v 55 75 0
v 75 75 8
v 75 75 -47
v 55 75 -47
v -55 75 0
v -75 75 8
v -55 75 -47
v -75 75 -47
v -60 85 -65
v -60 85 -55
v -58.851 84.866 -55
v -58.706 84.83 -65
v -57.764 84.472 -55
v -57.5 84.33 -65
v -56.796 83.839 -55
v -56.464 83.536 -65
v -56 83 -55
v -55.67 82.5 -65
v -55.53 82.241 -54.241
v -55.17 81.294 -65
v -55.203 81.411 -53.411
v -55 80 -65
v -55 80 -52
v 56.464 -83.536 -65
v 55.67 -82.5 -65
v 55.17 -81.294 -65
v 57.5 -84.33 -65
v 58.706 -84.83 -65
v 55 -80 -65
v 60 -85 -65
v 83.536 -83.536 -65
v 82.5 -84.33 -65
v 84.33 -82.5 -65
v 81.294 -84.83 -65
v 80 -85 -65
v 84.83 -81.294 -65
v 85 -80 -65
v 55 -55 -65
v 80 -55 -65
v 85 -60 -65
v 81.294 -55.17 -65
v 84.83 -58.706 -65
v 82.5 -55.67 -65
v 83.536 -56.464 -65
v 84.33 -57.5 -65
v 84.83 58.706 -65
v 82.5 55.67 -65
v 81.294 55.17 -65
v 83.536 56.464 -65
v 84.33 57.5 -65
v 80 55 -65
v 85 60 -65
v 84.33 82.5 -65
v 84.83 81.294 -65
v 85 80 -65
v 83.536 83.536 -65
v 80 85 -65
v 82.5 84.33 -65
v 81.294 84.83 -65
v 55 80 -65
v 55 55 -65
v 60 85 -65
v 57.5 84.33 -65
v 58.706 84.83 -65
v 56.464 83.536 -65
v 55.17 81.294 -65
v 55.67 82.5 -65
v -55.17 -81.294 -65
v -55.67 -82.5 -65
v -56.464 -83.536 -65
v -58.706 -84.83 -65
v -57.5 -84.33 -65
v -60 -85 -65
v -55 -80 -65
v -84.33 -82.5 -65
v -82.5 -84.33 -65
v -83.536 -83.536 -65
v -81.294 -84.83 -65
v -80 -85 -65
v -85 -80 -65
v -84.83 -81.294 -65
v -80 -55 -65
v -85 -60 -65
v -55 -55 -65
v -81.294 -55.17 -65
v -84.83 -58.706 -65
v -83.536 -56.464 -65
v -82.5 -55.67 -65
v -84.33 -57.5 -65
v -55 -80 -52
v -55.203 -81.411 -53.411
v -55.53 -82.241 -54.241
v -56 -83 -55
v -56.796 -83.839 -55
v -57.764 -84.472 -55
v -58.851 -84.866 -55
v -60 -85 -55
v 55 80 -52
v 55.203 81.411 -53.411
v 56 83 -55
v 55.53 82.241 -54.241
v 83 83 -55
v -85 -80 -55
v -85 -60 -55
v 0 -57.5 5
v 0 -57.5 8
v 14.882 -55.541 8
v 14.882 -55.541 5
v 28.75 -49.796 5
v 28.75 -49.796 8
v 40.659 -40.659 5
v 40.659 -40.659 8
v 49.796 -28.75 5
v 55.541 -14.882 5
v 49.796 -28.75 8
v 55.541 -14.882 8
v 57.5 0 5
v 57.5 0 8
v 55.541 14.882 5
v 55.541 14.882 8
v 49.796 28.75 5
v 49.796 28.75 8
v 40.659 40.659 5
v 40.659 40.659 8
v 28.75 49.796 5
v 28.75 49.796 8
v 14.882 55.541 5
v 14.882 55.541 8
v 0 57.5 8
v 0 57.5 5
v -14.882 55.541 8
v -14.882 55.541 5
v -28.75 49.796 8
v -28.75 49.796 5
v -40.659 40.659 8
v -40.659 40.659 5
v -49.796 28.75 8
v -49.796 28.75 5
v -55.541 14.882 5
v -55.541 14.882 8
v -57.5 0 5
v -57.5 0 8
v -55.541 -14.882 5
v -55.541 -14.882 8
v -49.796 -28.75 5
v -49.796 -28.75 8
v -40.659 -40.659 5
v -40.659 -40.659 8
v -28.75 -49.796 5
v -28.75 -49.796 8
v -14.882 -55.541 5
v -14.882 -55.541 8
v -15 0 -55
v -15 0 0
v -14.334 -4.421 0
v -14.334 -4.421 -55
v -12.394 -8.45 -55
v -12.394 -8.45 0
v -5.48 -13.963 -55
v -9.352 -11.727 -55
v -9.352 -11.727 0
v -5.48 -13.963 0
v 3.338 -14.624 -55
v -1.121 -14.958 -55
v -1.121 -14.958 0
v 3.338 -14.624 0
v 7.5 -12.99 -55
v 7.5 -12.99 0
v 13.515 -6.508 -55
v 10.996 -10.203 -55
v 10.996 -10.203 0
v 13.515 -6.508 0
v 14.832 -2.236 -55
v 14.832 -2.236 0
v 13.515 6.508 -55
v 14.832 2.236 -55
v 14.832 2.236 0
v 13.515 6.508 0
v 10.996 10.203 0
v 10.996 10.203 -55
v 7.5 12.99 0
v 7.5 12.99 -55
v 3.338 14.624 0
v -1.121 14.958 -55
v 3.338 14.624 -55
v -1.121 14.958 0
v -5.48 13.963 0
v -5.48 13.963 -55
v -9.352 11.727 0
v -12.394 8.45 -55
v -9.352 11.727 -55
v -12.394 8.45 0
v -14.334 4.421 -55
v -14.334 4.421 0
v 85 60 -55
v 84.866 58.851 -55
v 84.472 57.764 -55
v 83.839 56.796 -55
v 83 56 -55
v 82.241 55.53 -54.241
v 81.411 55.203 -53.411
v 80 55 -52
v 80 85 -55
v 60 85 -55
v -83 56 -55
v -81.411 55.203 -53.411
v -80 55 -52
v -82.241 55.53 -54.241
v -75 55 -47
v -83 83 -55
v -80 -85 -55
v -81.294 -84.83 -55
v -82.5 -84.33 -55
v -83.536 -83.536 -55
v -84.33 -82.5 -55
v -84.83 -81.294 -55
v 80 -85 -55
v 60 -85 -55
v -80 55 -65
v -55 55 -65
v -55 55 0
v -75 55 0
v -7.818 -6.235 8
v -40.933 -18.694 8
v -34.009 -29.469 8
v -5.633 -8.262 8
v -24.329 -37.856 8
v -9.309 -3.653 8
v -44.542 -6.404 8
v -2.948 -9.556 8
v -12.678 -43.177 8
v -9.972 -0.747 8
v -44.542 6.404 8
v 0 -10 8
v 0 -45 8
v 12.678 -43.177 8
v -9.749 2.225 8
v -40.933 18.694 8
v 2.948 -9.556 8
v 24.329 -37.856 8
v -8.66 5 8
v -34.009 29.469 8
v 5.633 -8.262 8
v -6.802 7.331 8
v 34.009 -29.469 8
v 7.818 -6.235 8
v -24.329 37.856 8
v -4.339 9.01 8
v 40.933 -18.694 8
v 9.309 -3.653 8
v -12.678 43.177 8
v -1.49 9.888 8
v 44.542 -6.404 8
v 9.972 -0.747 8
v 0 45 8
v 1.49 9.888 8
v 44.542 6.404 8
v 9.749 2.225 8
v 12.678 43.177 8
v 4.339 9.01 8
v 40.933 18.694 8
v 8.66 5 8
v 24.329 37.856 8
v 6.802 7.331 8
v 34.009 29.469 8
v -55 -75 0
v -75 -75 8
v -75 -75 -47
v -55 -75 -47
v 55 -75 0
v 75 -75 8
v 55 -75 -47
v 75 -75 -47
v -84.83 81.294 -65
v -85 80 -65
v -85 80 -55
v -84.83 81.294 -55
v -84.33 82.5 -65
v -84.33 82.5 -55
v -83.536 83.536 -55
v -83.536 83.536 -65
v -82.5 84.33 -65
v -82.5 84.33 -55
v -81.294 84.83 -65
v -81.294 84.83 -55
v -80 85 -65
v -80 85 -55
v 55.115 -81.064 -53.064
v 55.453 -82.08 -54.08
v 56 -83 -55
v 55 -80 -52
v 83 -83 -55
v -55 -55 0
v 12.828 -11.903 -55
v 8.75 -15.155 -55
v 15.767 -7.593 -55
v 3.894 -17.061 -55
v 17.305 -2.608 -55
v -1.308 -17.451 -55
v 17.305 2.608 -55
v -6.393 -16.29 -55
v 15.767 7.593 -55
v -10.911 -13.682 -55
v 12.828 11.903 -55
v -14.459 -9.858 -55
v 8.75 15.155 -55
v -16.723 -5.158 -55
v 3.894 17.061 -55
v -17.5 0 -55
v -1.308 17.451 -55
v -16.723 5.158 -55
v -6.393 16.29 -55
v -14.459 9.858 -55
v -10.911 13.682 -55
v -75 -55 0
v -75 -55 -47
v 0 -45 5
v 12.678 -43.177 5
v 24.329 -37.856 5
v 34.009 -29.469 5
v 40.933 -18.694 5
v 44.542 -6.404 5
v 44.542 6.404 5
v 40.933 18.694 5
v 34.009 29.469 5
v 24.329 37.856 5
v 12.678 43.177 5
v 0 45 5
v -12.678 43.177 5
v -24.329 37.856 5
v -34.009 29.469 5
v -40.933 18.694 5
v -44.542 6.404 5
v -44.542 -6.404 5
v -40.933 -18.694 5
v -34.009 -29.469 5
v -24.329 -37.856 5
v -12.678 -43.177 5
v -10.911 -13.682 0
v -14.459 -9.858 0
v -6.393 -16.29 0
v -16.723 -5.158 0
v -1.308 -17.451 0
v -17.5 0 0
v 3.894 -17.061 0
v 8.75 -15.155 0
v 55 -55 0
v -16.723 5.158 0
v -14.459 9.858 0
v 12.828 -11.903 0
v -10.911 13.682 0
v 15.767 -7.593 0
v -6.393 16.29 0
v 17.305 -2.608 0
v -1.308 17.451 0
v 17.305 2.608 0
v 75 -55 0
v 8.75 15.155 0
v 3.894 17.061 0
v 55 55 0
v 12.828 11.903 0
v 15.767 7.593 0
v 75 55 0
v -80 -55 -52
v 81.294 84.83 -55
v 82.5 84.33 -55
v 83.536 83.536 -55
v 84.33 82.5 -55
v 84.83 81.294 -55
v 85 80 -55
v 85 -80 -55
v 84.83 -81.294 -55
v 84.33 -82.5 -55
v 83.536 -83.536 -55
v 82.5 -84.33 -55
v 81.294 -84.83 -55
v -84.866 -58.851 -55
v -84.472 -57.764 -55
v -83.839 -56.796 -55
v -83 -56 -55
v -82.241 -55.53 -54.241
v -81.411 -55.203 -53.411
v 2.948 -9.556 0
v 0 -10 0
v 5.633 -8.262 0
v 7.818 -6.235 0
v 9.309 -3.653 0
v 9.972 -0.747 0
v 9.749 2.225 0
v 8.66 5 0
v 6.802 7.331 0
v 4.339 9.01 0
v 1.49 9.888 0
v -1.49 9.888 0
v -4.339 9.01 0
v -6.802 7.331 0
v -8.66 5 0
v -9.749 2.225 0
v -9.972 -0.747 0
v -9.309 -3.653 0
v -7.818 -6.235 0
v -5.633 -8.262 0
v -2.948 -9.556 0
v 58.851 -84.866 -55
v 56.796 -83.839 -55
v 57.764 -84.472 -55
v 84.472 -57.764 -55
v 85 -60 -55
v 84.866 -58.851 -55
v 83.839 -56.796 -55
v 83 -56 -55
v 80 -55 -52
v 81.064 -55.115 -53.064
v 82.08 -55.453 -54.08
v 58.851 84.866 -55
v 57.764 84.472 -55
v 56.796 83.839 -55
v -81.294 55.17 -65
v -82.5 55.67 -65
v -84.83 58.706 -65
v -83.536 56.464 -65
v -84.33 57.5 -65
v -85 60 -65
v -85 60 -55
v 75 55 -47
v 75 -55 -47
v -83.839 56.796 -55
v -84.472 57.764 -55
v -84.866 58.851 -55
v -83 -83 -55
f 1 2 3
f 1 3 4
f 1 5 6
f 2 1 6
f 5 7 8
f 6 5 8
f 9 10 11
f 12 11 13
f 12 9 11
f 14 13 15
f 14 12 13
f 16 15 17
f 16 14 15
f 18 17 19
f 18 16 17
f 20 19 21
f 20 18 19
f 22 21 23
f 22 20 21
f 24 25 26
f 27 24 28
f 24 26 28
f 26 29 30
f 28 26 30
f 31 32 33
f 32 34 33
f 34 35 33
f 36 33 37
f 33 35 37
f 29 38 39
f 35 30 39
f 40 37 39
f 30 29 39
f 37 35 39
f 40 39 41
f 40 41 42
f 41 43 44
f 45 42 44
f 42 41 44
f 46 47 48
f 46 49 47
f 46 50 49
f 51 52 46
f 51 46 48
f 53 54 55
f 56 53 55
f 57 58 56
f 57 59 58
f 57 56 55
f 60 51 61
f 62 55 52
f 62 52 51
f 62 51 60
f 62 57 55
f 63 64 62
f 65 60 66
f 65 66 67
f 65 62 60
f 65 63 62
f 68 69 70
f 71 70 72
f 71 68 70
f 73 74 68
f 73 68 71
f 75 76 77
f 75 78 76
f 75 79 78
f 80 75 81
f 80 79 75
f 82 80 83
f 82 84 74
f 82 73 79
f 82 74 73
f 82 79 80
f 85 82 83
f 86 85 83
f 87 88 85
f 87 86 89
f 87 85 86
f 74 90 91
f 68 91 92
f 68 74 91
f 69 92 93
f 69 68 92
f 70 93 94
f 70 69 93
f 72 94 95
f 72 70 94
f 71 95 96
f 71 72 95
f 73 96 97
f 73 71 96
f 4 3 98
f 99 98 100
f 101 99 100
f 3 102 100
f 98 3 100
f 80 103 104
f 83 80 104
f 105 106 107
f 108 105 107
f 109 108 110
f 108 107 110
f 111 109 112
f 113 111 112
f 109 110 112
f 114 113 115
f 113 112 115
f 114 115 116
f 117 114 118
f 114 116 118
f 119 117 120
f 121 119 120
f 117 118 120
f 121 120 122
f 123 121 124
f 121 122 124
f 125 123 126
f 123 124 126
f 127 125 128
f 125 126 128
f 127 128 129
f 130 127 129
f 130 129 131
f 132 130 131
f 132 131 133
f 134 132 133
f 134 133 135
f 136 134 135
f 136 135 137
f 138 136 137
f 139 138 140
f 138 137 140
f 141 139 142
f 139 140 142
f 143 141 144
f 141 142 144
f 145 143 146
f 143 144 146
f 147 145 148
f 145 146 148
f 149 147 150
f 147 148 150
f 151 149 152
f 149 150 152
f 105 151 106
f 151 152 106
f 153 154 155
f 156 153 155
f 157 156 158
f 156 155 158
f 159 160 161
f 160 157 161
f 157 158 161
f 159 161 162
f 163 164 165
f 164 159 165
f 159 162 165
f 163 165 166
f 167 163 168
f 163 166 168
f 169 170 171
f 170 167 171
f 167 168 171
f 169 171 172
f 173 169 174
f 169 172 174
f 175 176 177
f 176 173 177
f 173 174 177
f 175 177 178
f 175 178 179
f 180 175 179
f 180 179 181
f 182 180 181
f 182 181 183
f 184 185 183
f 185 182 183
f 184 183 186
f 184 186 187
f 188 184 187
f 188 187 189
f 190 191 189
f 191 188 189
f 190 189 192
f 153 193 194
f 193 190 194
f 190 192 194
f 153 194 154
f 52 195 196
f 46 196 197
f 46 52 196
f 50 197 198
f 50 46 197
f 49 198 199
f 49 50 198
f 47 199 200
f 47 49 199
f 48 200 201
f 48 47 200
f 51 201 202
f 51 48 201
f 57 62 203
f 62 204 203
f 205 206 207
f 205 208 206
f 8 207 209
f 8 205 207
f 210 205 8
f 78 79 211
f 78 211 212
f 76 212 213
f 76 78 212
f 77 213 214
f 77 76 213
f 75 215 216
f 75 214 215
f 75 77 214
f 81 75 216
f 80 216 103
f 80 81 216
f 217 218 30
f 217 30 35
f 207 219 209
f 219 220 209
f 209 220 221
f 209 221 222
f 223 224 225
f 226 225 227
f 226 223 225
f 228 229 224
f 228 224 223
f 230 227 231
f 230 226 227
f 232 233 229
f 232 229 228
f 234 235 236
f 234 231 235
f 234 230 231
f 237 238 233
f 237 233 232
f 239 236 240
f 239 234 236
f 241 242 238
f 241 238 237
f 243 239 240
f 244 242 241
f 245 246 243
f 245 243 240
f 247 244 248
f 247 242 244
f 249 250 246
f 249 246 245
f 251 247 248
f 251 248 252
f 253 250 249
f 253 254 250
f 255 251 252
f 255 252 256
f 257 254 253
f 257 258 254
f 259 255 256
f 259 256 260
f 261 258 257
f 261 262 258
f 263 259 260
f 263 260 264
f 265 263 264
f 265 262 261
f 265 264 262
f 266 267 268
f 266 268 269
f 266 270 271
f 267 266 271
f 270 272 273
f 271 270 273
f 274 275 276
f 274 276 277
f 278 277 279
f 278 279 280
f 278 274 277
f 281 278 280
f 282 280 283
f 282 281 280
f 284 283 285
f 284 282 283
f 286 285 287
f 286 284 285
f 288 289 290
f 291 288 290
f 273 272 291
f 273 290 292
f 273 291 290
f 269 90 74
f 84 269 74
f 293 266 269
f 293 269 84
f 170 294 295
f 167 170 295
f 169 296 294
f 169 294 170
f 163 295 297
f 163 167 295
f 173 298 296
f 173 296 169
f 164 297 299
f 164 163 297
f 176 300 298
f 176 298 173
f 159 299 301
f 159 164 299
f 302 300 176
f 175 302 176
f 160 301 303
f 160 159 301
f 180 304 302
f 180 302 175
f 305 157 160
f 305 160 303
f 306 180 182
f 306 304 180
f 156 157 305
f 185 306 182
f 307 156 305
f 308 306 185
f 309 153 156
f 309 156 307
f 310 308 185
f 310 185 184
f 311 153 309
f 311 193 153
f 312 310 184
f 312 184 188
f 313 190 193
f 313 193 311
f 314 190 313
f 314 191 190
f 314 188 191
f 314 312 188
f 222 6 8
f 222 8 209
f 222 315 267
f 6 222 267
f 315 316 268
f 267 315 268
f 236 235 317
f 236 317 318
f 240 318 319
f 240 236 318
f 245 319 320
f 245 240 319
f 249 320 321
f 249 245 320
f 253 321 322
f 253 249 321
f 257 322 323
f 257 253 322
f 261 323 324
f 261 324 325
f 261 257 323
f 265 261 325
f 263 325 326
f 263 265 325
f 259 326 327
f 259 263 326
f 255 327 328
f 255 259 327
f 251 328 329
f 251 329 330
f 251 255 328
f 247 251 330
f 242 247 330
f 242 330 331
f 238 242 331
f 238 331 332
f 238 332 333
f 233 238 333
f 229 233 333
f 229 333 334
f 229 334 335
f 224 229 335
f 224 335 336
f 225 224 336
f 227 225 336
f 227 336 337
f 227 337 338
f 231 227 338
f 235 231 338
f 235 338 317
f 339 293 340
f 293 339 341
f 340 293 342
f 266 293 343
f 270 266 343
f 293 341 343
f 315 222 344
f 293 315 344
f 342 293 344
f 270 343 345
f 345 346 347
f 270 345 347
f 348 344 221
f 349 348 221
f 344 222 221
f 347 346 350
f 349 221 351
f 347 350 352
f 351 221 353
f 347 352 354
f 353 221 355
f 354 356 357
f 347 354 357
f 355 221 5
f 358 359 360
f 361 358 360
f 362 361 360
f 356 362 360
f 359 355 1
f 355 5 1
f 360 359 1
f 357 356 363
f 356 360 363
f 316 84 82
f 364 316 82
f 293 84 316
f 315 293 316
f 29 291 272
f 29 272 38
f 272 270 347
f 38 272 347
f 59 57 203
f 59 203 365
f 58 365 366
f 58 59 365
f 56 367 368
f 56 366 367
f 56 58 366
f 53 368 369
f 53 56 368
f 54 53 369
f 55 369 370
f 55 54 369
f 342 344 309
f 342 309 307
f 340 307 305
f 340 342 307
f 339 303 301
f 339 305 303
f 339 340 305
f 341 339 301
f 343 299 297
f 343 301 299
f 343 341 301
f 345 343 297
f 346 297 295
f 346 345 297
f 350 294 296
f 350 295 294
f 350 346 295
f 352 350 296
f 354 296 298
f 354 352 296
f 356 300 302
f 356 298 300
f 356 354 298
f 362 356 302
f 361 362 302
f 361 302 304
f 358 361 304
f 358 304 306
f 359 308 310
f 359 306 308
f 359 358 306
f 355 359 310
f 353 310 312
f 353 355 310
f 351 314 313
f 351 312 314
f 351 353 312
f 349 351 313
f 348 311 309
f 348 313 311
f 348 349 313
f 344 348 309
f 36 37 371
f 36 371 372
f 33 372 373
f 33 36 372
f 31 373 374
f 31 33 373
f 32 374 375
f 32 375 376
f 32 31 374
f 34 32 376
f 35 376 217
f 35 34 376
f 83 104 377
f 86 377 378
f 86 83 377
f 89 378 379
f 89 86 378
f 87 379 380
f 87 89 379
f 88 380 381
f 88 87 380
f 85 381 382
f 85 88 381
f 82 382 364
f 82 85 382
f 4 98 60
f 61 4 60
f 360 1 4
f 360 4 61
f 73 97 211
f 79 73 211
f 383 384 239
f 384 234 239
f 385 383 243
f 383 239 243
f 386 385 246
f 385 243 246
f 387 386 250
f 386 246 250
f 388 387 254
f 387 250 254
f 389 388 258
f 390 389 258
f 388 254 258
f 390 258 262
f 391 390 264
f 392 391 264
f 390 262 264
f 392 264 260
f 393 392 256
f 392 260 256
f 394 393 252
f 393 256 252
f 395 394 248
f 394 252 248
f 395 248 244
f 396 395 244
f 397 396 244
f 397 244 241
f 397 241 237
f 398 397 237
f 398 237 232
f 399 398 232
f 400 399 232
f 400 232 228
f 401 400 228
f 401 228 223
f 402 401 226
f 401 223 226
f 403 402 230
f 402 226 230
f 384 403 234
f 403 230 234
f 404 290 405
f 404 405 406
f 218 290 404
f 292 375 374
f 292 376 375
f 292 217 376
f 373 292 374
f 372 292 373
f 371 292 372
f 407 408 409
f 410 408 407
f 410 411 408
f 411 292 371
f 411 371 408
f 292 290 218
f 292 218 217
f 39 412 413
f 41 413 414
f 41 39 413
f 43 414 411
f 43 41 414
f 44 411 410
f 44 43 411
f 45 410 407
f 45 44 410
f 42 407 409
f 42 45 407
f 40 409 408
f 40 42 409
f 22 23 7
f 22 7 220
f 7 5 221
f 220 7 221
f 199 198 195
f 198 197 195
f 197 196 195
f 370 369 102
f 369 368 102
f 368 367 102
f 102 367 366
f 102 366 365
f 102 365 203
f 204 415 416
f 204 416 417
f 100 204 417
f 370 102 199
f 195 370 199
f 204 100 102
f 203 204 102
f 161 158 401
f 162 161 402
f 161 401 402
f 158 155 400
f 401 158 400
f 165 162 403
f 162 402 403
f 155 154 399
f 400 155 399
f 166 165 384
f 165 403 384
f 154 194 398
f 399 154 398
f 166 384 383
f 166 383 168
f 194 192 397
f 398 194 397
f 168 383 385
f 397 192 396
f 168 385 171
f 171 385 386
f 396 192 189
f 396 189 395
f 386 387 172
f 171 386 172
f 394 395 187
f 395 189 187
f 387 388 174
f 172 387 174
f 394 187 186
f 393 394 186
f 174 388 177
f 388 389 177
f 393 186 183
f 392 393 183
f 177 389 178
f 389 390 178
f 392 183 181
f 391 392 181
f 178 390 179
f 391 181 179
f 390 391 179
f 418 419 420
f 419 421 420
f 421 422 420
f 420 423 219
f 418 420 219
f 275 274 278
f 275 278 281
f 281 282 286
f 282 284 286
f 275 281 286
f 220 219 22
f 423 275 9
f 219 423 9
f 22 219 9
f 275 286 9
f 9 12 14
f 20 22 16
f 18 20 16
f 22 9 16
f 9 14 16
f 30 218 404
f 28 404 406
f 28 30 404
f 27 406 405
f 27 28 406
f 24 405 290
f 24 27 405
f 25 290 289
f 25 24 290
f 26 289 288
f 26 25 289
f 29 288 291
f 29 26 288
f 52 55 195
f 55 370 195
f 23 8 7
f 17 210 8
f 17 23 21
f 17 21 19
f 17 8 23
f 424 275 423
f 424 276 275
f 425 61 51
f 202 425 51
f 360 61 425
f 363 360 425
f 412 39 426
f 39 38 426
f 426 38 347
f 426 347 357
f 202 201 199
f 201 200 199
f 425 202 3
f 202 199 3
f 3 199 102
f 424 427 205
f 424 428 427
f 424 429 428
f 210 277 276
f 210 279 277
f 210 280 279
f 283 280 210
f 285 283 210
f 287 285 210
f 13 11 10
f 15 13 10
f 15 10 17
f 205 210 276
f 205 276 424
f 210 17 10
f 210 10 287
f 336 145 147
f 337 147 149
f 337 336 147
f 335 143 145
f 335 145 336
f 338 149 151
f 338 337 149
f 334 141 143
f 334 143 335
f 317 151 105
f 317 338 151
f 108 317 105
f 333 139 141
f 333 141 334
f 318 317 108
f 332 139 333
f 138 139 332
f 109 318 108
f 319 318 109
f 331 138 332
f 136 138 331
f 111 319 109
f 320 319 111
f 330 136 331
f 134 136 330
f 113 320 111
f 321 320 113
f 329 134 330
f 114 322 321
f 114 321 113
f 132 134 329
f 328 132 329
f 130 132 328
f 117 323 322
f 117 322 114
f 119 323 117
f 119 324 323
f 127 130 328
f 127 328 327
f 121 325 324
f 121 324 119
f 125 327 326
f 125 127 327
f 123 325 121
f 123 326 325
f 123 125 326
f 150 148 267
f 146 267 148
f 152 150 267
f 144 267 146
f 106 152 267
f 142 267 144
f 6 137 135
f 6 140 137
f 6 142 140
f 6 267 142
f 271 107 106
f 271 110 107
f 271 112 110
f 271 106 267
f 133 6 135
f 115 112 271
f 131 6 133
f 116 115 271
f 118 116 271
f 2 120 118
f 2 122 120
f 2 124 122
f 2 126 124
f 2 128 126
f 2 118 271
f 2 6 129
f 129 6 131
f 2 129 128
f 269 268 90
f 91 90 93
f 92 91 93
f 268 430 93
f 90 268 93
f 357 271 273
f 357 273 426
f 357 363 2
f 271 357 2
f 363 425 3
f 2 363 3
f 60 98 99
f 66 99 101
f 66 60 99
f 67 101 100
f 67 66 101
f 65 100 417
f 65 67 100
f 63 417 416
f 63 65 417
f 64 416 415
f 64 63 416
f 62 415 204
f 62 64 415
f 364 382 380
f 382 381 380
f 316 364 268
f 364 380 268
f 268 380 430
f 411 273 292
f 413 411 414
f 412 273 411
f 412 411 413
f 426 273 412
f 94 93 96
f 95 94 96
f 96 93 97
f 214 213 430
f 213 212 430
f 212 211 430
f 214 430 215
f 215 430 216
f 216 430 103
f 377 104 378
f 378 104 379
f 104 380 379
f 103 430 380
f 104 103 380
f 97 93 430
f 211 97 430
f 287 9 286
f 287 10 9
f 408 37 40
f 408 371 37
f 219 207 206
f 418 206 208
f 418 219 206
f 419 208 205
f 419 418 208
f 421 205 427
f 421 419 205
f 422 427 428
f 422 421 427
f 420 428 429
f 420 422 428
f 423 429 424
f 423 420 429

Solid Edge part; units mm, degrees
sketch "Sketch1" plane through (0, 0, 0) normal (0, 0, 1) x (1, 0, 0)
  line L0 (-75, -75) -> (75, -75)
  line L1 (75, -75) -> (75, 75)
  line L2 (75, 75) -> (-75, 75)
  line L3 (-75, 75) -> (-75, -75)
  dimension "D1" = 150
extrude "Ajout_matière_1" add sketch "Sketch1" along normal blind 8
sketch "Sketch2" plane through (0, 0, 0) normal (0, 0, -1) x (-1, 0, 0)
  line L0 (-75, 75) -> (-55, 75)
  line L1 (-55, 75) -> (-55, 55)
  line L2 (-55, 55) -> (-75, 55)
  line L3 (-75, 55) -> (-75, 75)
  line L4 (75, 75) -> (55, 75)
  line L5 (55, 75) -> (55, 55)
  line L6 (55, 55) -> (75, 55)
  line L7 (75, 55) -> (75, 75)
  line L8 (75, -75) -> (55, -75)
  line L9 (55, -75) -> (55, -55)
  line L10 (55, -55) -> (75, -55)
  line L11 (75, -55) -> (75, -75)
  line L12 (-75, -75) -> (-55, -75)
  line L13 (-55, -75) -> (-55, -55)
  line L14 (-55, -55) -> (-75, -55)
  line L15 (-75, -55) -> (-75, -75)
  dimension "D1" = 20
extrude "Ajout_matière_2" add sketch "Sketch2" along normal blind 55
sketch "Sketch3" plane through (65, 65, -55) normal (0, 0, -1) x (0, 1, 0)
  line L0 (-10, -10) -> (20, -10)
  line L1 (20, -10) -> (20, 20)
  line L2 (20, 20) -> (-10, 20)
  line L3 (-10, 20) -> (-10, -10)
  line L4 (-10, -120) -> (20, -120)
  line L5 (20, -120) -> (20, -150)
  line L6 (20, -150) -> (-10, -150)
  line L7 (-10, -150) -> (-10, -120)
  line L8 (-120, -120) -> (-150, -120)
  line L9 (-150, -120) -> (-150, -150)
  line L10 (-150, -150) -> (-120, -150)
  line L11 (-120, -150) -> (-120, -120)
  line L12 (-120, -10) -> (-150, -10)
  line L13 (-150, -10) -> (-150, 20)
  line L14 (-150, 20) -> (-120, 20)
  line L15 (-120, 20) -> (-120, -10)
  dimension "D1" = 30
extrude "Ajout_matière_3" add sketch "Sketch3" along normal blind 10
fillet "Congé_1" radius 5 12 edges at (85, -85, -60) (85, -55, -60) (55, -85, -60) (-85, -85, -60) (-55, -85, -60) (-85, -55, -60) (-85, 55, -60) (-85, 85, -60) (-55, 85, -60) (55, 85, -60) (85, 85, -60) (85, 55, -60)
sketch "Sketch4" plane through (0, 0, 8) normal (0, 0, 1) x (0, -1, 0)
  circle A0 centre (0, 0) radius 57.5
  circle A1 centre (0, 0) radius 45
  dimension "D1" = 115
  dimension "D2" = 90
extrude "Enlèvement_matière_1" cut sketch "Sketch4" against normal blind 3
sketch "Sketch5" plane through (0, 0, 8) normal (0, 0, 1) x (0, -1, 0)
  circle A0 centre (0, 0) radius 10
  dimension "D1" = 20
extrude "Enlèvement_matière_2" cut sketch "Sketch5" against normal blind 92.4618
chamfer "Chanfrein_1" distance 8 angle 45 8 edges at (65, 75, -55) (75, 65, -55) (-65, 75, -55) (-75, 65, -55) (-75, -65, -55) (-65, -75, -55) (65, -75, -55) (75, -65, -55)
sketch "Sketch6" plane through (0, 0, 0) normal (0, 0, -1) x (-1, 0, 0)
  circle A0 centre (0, 0) radius 17.5
  circle A1 centre (0, 0) radius 15
  dimension "D1" = 30
  dimension "D2" = 35
extrude "Ajout_matière_4" add sketch "Sketch6" along normal blind 55
properties material "Acier S235"
